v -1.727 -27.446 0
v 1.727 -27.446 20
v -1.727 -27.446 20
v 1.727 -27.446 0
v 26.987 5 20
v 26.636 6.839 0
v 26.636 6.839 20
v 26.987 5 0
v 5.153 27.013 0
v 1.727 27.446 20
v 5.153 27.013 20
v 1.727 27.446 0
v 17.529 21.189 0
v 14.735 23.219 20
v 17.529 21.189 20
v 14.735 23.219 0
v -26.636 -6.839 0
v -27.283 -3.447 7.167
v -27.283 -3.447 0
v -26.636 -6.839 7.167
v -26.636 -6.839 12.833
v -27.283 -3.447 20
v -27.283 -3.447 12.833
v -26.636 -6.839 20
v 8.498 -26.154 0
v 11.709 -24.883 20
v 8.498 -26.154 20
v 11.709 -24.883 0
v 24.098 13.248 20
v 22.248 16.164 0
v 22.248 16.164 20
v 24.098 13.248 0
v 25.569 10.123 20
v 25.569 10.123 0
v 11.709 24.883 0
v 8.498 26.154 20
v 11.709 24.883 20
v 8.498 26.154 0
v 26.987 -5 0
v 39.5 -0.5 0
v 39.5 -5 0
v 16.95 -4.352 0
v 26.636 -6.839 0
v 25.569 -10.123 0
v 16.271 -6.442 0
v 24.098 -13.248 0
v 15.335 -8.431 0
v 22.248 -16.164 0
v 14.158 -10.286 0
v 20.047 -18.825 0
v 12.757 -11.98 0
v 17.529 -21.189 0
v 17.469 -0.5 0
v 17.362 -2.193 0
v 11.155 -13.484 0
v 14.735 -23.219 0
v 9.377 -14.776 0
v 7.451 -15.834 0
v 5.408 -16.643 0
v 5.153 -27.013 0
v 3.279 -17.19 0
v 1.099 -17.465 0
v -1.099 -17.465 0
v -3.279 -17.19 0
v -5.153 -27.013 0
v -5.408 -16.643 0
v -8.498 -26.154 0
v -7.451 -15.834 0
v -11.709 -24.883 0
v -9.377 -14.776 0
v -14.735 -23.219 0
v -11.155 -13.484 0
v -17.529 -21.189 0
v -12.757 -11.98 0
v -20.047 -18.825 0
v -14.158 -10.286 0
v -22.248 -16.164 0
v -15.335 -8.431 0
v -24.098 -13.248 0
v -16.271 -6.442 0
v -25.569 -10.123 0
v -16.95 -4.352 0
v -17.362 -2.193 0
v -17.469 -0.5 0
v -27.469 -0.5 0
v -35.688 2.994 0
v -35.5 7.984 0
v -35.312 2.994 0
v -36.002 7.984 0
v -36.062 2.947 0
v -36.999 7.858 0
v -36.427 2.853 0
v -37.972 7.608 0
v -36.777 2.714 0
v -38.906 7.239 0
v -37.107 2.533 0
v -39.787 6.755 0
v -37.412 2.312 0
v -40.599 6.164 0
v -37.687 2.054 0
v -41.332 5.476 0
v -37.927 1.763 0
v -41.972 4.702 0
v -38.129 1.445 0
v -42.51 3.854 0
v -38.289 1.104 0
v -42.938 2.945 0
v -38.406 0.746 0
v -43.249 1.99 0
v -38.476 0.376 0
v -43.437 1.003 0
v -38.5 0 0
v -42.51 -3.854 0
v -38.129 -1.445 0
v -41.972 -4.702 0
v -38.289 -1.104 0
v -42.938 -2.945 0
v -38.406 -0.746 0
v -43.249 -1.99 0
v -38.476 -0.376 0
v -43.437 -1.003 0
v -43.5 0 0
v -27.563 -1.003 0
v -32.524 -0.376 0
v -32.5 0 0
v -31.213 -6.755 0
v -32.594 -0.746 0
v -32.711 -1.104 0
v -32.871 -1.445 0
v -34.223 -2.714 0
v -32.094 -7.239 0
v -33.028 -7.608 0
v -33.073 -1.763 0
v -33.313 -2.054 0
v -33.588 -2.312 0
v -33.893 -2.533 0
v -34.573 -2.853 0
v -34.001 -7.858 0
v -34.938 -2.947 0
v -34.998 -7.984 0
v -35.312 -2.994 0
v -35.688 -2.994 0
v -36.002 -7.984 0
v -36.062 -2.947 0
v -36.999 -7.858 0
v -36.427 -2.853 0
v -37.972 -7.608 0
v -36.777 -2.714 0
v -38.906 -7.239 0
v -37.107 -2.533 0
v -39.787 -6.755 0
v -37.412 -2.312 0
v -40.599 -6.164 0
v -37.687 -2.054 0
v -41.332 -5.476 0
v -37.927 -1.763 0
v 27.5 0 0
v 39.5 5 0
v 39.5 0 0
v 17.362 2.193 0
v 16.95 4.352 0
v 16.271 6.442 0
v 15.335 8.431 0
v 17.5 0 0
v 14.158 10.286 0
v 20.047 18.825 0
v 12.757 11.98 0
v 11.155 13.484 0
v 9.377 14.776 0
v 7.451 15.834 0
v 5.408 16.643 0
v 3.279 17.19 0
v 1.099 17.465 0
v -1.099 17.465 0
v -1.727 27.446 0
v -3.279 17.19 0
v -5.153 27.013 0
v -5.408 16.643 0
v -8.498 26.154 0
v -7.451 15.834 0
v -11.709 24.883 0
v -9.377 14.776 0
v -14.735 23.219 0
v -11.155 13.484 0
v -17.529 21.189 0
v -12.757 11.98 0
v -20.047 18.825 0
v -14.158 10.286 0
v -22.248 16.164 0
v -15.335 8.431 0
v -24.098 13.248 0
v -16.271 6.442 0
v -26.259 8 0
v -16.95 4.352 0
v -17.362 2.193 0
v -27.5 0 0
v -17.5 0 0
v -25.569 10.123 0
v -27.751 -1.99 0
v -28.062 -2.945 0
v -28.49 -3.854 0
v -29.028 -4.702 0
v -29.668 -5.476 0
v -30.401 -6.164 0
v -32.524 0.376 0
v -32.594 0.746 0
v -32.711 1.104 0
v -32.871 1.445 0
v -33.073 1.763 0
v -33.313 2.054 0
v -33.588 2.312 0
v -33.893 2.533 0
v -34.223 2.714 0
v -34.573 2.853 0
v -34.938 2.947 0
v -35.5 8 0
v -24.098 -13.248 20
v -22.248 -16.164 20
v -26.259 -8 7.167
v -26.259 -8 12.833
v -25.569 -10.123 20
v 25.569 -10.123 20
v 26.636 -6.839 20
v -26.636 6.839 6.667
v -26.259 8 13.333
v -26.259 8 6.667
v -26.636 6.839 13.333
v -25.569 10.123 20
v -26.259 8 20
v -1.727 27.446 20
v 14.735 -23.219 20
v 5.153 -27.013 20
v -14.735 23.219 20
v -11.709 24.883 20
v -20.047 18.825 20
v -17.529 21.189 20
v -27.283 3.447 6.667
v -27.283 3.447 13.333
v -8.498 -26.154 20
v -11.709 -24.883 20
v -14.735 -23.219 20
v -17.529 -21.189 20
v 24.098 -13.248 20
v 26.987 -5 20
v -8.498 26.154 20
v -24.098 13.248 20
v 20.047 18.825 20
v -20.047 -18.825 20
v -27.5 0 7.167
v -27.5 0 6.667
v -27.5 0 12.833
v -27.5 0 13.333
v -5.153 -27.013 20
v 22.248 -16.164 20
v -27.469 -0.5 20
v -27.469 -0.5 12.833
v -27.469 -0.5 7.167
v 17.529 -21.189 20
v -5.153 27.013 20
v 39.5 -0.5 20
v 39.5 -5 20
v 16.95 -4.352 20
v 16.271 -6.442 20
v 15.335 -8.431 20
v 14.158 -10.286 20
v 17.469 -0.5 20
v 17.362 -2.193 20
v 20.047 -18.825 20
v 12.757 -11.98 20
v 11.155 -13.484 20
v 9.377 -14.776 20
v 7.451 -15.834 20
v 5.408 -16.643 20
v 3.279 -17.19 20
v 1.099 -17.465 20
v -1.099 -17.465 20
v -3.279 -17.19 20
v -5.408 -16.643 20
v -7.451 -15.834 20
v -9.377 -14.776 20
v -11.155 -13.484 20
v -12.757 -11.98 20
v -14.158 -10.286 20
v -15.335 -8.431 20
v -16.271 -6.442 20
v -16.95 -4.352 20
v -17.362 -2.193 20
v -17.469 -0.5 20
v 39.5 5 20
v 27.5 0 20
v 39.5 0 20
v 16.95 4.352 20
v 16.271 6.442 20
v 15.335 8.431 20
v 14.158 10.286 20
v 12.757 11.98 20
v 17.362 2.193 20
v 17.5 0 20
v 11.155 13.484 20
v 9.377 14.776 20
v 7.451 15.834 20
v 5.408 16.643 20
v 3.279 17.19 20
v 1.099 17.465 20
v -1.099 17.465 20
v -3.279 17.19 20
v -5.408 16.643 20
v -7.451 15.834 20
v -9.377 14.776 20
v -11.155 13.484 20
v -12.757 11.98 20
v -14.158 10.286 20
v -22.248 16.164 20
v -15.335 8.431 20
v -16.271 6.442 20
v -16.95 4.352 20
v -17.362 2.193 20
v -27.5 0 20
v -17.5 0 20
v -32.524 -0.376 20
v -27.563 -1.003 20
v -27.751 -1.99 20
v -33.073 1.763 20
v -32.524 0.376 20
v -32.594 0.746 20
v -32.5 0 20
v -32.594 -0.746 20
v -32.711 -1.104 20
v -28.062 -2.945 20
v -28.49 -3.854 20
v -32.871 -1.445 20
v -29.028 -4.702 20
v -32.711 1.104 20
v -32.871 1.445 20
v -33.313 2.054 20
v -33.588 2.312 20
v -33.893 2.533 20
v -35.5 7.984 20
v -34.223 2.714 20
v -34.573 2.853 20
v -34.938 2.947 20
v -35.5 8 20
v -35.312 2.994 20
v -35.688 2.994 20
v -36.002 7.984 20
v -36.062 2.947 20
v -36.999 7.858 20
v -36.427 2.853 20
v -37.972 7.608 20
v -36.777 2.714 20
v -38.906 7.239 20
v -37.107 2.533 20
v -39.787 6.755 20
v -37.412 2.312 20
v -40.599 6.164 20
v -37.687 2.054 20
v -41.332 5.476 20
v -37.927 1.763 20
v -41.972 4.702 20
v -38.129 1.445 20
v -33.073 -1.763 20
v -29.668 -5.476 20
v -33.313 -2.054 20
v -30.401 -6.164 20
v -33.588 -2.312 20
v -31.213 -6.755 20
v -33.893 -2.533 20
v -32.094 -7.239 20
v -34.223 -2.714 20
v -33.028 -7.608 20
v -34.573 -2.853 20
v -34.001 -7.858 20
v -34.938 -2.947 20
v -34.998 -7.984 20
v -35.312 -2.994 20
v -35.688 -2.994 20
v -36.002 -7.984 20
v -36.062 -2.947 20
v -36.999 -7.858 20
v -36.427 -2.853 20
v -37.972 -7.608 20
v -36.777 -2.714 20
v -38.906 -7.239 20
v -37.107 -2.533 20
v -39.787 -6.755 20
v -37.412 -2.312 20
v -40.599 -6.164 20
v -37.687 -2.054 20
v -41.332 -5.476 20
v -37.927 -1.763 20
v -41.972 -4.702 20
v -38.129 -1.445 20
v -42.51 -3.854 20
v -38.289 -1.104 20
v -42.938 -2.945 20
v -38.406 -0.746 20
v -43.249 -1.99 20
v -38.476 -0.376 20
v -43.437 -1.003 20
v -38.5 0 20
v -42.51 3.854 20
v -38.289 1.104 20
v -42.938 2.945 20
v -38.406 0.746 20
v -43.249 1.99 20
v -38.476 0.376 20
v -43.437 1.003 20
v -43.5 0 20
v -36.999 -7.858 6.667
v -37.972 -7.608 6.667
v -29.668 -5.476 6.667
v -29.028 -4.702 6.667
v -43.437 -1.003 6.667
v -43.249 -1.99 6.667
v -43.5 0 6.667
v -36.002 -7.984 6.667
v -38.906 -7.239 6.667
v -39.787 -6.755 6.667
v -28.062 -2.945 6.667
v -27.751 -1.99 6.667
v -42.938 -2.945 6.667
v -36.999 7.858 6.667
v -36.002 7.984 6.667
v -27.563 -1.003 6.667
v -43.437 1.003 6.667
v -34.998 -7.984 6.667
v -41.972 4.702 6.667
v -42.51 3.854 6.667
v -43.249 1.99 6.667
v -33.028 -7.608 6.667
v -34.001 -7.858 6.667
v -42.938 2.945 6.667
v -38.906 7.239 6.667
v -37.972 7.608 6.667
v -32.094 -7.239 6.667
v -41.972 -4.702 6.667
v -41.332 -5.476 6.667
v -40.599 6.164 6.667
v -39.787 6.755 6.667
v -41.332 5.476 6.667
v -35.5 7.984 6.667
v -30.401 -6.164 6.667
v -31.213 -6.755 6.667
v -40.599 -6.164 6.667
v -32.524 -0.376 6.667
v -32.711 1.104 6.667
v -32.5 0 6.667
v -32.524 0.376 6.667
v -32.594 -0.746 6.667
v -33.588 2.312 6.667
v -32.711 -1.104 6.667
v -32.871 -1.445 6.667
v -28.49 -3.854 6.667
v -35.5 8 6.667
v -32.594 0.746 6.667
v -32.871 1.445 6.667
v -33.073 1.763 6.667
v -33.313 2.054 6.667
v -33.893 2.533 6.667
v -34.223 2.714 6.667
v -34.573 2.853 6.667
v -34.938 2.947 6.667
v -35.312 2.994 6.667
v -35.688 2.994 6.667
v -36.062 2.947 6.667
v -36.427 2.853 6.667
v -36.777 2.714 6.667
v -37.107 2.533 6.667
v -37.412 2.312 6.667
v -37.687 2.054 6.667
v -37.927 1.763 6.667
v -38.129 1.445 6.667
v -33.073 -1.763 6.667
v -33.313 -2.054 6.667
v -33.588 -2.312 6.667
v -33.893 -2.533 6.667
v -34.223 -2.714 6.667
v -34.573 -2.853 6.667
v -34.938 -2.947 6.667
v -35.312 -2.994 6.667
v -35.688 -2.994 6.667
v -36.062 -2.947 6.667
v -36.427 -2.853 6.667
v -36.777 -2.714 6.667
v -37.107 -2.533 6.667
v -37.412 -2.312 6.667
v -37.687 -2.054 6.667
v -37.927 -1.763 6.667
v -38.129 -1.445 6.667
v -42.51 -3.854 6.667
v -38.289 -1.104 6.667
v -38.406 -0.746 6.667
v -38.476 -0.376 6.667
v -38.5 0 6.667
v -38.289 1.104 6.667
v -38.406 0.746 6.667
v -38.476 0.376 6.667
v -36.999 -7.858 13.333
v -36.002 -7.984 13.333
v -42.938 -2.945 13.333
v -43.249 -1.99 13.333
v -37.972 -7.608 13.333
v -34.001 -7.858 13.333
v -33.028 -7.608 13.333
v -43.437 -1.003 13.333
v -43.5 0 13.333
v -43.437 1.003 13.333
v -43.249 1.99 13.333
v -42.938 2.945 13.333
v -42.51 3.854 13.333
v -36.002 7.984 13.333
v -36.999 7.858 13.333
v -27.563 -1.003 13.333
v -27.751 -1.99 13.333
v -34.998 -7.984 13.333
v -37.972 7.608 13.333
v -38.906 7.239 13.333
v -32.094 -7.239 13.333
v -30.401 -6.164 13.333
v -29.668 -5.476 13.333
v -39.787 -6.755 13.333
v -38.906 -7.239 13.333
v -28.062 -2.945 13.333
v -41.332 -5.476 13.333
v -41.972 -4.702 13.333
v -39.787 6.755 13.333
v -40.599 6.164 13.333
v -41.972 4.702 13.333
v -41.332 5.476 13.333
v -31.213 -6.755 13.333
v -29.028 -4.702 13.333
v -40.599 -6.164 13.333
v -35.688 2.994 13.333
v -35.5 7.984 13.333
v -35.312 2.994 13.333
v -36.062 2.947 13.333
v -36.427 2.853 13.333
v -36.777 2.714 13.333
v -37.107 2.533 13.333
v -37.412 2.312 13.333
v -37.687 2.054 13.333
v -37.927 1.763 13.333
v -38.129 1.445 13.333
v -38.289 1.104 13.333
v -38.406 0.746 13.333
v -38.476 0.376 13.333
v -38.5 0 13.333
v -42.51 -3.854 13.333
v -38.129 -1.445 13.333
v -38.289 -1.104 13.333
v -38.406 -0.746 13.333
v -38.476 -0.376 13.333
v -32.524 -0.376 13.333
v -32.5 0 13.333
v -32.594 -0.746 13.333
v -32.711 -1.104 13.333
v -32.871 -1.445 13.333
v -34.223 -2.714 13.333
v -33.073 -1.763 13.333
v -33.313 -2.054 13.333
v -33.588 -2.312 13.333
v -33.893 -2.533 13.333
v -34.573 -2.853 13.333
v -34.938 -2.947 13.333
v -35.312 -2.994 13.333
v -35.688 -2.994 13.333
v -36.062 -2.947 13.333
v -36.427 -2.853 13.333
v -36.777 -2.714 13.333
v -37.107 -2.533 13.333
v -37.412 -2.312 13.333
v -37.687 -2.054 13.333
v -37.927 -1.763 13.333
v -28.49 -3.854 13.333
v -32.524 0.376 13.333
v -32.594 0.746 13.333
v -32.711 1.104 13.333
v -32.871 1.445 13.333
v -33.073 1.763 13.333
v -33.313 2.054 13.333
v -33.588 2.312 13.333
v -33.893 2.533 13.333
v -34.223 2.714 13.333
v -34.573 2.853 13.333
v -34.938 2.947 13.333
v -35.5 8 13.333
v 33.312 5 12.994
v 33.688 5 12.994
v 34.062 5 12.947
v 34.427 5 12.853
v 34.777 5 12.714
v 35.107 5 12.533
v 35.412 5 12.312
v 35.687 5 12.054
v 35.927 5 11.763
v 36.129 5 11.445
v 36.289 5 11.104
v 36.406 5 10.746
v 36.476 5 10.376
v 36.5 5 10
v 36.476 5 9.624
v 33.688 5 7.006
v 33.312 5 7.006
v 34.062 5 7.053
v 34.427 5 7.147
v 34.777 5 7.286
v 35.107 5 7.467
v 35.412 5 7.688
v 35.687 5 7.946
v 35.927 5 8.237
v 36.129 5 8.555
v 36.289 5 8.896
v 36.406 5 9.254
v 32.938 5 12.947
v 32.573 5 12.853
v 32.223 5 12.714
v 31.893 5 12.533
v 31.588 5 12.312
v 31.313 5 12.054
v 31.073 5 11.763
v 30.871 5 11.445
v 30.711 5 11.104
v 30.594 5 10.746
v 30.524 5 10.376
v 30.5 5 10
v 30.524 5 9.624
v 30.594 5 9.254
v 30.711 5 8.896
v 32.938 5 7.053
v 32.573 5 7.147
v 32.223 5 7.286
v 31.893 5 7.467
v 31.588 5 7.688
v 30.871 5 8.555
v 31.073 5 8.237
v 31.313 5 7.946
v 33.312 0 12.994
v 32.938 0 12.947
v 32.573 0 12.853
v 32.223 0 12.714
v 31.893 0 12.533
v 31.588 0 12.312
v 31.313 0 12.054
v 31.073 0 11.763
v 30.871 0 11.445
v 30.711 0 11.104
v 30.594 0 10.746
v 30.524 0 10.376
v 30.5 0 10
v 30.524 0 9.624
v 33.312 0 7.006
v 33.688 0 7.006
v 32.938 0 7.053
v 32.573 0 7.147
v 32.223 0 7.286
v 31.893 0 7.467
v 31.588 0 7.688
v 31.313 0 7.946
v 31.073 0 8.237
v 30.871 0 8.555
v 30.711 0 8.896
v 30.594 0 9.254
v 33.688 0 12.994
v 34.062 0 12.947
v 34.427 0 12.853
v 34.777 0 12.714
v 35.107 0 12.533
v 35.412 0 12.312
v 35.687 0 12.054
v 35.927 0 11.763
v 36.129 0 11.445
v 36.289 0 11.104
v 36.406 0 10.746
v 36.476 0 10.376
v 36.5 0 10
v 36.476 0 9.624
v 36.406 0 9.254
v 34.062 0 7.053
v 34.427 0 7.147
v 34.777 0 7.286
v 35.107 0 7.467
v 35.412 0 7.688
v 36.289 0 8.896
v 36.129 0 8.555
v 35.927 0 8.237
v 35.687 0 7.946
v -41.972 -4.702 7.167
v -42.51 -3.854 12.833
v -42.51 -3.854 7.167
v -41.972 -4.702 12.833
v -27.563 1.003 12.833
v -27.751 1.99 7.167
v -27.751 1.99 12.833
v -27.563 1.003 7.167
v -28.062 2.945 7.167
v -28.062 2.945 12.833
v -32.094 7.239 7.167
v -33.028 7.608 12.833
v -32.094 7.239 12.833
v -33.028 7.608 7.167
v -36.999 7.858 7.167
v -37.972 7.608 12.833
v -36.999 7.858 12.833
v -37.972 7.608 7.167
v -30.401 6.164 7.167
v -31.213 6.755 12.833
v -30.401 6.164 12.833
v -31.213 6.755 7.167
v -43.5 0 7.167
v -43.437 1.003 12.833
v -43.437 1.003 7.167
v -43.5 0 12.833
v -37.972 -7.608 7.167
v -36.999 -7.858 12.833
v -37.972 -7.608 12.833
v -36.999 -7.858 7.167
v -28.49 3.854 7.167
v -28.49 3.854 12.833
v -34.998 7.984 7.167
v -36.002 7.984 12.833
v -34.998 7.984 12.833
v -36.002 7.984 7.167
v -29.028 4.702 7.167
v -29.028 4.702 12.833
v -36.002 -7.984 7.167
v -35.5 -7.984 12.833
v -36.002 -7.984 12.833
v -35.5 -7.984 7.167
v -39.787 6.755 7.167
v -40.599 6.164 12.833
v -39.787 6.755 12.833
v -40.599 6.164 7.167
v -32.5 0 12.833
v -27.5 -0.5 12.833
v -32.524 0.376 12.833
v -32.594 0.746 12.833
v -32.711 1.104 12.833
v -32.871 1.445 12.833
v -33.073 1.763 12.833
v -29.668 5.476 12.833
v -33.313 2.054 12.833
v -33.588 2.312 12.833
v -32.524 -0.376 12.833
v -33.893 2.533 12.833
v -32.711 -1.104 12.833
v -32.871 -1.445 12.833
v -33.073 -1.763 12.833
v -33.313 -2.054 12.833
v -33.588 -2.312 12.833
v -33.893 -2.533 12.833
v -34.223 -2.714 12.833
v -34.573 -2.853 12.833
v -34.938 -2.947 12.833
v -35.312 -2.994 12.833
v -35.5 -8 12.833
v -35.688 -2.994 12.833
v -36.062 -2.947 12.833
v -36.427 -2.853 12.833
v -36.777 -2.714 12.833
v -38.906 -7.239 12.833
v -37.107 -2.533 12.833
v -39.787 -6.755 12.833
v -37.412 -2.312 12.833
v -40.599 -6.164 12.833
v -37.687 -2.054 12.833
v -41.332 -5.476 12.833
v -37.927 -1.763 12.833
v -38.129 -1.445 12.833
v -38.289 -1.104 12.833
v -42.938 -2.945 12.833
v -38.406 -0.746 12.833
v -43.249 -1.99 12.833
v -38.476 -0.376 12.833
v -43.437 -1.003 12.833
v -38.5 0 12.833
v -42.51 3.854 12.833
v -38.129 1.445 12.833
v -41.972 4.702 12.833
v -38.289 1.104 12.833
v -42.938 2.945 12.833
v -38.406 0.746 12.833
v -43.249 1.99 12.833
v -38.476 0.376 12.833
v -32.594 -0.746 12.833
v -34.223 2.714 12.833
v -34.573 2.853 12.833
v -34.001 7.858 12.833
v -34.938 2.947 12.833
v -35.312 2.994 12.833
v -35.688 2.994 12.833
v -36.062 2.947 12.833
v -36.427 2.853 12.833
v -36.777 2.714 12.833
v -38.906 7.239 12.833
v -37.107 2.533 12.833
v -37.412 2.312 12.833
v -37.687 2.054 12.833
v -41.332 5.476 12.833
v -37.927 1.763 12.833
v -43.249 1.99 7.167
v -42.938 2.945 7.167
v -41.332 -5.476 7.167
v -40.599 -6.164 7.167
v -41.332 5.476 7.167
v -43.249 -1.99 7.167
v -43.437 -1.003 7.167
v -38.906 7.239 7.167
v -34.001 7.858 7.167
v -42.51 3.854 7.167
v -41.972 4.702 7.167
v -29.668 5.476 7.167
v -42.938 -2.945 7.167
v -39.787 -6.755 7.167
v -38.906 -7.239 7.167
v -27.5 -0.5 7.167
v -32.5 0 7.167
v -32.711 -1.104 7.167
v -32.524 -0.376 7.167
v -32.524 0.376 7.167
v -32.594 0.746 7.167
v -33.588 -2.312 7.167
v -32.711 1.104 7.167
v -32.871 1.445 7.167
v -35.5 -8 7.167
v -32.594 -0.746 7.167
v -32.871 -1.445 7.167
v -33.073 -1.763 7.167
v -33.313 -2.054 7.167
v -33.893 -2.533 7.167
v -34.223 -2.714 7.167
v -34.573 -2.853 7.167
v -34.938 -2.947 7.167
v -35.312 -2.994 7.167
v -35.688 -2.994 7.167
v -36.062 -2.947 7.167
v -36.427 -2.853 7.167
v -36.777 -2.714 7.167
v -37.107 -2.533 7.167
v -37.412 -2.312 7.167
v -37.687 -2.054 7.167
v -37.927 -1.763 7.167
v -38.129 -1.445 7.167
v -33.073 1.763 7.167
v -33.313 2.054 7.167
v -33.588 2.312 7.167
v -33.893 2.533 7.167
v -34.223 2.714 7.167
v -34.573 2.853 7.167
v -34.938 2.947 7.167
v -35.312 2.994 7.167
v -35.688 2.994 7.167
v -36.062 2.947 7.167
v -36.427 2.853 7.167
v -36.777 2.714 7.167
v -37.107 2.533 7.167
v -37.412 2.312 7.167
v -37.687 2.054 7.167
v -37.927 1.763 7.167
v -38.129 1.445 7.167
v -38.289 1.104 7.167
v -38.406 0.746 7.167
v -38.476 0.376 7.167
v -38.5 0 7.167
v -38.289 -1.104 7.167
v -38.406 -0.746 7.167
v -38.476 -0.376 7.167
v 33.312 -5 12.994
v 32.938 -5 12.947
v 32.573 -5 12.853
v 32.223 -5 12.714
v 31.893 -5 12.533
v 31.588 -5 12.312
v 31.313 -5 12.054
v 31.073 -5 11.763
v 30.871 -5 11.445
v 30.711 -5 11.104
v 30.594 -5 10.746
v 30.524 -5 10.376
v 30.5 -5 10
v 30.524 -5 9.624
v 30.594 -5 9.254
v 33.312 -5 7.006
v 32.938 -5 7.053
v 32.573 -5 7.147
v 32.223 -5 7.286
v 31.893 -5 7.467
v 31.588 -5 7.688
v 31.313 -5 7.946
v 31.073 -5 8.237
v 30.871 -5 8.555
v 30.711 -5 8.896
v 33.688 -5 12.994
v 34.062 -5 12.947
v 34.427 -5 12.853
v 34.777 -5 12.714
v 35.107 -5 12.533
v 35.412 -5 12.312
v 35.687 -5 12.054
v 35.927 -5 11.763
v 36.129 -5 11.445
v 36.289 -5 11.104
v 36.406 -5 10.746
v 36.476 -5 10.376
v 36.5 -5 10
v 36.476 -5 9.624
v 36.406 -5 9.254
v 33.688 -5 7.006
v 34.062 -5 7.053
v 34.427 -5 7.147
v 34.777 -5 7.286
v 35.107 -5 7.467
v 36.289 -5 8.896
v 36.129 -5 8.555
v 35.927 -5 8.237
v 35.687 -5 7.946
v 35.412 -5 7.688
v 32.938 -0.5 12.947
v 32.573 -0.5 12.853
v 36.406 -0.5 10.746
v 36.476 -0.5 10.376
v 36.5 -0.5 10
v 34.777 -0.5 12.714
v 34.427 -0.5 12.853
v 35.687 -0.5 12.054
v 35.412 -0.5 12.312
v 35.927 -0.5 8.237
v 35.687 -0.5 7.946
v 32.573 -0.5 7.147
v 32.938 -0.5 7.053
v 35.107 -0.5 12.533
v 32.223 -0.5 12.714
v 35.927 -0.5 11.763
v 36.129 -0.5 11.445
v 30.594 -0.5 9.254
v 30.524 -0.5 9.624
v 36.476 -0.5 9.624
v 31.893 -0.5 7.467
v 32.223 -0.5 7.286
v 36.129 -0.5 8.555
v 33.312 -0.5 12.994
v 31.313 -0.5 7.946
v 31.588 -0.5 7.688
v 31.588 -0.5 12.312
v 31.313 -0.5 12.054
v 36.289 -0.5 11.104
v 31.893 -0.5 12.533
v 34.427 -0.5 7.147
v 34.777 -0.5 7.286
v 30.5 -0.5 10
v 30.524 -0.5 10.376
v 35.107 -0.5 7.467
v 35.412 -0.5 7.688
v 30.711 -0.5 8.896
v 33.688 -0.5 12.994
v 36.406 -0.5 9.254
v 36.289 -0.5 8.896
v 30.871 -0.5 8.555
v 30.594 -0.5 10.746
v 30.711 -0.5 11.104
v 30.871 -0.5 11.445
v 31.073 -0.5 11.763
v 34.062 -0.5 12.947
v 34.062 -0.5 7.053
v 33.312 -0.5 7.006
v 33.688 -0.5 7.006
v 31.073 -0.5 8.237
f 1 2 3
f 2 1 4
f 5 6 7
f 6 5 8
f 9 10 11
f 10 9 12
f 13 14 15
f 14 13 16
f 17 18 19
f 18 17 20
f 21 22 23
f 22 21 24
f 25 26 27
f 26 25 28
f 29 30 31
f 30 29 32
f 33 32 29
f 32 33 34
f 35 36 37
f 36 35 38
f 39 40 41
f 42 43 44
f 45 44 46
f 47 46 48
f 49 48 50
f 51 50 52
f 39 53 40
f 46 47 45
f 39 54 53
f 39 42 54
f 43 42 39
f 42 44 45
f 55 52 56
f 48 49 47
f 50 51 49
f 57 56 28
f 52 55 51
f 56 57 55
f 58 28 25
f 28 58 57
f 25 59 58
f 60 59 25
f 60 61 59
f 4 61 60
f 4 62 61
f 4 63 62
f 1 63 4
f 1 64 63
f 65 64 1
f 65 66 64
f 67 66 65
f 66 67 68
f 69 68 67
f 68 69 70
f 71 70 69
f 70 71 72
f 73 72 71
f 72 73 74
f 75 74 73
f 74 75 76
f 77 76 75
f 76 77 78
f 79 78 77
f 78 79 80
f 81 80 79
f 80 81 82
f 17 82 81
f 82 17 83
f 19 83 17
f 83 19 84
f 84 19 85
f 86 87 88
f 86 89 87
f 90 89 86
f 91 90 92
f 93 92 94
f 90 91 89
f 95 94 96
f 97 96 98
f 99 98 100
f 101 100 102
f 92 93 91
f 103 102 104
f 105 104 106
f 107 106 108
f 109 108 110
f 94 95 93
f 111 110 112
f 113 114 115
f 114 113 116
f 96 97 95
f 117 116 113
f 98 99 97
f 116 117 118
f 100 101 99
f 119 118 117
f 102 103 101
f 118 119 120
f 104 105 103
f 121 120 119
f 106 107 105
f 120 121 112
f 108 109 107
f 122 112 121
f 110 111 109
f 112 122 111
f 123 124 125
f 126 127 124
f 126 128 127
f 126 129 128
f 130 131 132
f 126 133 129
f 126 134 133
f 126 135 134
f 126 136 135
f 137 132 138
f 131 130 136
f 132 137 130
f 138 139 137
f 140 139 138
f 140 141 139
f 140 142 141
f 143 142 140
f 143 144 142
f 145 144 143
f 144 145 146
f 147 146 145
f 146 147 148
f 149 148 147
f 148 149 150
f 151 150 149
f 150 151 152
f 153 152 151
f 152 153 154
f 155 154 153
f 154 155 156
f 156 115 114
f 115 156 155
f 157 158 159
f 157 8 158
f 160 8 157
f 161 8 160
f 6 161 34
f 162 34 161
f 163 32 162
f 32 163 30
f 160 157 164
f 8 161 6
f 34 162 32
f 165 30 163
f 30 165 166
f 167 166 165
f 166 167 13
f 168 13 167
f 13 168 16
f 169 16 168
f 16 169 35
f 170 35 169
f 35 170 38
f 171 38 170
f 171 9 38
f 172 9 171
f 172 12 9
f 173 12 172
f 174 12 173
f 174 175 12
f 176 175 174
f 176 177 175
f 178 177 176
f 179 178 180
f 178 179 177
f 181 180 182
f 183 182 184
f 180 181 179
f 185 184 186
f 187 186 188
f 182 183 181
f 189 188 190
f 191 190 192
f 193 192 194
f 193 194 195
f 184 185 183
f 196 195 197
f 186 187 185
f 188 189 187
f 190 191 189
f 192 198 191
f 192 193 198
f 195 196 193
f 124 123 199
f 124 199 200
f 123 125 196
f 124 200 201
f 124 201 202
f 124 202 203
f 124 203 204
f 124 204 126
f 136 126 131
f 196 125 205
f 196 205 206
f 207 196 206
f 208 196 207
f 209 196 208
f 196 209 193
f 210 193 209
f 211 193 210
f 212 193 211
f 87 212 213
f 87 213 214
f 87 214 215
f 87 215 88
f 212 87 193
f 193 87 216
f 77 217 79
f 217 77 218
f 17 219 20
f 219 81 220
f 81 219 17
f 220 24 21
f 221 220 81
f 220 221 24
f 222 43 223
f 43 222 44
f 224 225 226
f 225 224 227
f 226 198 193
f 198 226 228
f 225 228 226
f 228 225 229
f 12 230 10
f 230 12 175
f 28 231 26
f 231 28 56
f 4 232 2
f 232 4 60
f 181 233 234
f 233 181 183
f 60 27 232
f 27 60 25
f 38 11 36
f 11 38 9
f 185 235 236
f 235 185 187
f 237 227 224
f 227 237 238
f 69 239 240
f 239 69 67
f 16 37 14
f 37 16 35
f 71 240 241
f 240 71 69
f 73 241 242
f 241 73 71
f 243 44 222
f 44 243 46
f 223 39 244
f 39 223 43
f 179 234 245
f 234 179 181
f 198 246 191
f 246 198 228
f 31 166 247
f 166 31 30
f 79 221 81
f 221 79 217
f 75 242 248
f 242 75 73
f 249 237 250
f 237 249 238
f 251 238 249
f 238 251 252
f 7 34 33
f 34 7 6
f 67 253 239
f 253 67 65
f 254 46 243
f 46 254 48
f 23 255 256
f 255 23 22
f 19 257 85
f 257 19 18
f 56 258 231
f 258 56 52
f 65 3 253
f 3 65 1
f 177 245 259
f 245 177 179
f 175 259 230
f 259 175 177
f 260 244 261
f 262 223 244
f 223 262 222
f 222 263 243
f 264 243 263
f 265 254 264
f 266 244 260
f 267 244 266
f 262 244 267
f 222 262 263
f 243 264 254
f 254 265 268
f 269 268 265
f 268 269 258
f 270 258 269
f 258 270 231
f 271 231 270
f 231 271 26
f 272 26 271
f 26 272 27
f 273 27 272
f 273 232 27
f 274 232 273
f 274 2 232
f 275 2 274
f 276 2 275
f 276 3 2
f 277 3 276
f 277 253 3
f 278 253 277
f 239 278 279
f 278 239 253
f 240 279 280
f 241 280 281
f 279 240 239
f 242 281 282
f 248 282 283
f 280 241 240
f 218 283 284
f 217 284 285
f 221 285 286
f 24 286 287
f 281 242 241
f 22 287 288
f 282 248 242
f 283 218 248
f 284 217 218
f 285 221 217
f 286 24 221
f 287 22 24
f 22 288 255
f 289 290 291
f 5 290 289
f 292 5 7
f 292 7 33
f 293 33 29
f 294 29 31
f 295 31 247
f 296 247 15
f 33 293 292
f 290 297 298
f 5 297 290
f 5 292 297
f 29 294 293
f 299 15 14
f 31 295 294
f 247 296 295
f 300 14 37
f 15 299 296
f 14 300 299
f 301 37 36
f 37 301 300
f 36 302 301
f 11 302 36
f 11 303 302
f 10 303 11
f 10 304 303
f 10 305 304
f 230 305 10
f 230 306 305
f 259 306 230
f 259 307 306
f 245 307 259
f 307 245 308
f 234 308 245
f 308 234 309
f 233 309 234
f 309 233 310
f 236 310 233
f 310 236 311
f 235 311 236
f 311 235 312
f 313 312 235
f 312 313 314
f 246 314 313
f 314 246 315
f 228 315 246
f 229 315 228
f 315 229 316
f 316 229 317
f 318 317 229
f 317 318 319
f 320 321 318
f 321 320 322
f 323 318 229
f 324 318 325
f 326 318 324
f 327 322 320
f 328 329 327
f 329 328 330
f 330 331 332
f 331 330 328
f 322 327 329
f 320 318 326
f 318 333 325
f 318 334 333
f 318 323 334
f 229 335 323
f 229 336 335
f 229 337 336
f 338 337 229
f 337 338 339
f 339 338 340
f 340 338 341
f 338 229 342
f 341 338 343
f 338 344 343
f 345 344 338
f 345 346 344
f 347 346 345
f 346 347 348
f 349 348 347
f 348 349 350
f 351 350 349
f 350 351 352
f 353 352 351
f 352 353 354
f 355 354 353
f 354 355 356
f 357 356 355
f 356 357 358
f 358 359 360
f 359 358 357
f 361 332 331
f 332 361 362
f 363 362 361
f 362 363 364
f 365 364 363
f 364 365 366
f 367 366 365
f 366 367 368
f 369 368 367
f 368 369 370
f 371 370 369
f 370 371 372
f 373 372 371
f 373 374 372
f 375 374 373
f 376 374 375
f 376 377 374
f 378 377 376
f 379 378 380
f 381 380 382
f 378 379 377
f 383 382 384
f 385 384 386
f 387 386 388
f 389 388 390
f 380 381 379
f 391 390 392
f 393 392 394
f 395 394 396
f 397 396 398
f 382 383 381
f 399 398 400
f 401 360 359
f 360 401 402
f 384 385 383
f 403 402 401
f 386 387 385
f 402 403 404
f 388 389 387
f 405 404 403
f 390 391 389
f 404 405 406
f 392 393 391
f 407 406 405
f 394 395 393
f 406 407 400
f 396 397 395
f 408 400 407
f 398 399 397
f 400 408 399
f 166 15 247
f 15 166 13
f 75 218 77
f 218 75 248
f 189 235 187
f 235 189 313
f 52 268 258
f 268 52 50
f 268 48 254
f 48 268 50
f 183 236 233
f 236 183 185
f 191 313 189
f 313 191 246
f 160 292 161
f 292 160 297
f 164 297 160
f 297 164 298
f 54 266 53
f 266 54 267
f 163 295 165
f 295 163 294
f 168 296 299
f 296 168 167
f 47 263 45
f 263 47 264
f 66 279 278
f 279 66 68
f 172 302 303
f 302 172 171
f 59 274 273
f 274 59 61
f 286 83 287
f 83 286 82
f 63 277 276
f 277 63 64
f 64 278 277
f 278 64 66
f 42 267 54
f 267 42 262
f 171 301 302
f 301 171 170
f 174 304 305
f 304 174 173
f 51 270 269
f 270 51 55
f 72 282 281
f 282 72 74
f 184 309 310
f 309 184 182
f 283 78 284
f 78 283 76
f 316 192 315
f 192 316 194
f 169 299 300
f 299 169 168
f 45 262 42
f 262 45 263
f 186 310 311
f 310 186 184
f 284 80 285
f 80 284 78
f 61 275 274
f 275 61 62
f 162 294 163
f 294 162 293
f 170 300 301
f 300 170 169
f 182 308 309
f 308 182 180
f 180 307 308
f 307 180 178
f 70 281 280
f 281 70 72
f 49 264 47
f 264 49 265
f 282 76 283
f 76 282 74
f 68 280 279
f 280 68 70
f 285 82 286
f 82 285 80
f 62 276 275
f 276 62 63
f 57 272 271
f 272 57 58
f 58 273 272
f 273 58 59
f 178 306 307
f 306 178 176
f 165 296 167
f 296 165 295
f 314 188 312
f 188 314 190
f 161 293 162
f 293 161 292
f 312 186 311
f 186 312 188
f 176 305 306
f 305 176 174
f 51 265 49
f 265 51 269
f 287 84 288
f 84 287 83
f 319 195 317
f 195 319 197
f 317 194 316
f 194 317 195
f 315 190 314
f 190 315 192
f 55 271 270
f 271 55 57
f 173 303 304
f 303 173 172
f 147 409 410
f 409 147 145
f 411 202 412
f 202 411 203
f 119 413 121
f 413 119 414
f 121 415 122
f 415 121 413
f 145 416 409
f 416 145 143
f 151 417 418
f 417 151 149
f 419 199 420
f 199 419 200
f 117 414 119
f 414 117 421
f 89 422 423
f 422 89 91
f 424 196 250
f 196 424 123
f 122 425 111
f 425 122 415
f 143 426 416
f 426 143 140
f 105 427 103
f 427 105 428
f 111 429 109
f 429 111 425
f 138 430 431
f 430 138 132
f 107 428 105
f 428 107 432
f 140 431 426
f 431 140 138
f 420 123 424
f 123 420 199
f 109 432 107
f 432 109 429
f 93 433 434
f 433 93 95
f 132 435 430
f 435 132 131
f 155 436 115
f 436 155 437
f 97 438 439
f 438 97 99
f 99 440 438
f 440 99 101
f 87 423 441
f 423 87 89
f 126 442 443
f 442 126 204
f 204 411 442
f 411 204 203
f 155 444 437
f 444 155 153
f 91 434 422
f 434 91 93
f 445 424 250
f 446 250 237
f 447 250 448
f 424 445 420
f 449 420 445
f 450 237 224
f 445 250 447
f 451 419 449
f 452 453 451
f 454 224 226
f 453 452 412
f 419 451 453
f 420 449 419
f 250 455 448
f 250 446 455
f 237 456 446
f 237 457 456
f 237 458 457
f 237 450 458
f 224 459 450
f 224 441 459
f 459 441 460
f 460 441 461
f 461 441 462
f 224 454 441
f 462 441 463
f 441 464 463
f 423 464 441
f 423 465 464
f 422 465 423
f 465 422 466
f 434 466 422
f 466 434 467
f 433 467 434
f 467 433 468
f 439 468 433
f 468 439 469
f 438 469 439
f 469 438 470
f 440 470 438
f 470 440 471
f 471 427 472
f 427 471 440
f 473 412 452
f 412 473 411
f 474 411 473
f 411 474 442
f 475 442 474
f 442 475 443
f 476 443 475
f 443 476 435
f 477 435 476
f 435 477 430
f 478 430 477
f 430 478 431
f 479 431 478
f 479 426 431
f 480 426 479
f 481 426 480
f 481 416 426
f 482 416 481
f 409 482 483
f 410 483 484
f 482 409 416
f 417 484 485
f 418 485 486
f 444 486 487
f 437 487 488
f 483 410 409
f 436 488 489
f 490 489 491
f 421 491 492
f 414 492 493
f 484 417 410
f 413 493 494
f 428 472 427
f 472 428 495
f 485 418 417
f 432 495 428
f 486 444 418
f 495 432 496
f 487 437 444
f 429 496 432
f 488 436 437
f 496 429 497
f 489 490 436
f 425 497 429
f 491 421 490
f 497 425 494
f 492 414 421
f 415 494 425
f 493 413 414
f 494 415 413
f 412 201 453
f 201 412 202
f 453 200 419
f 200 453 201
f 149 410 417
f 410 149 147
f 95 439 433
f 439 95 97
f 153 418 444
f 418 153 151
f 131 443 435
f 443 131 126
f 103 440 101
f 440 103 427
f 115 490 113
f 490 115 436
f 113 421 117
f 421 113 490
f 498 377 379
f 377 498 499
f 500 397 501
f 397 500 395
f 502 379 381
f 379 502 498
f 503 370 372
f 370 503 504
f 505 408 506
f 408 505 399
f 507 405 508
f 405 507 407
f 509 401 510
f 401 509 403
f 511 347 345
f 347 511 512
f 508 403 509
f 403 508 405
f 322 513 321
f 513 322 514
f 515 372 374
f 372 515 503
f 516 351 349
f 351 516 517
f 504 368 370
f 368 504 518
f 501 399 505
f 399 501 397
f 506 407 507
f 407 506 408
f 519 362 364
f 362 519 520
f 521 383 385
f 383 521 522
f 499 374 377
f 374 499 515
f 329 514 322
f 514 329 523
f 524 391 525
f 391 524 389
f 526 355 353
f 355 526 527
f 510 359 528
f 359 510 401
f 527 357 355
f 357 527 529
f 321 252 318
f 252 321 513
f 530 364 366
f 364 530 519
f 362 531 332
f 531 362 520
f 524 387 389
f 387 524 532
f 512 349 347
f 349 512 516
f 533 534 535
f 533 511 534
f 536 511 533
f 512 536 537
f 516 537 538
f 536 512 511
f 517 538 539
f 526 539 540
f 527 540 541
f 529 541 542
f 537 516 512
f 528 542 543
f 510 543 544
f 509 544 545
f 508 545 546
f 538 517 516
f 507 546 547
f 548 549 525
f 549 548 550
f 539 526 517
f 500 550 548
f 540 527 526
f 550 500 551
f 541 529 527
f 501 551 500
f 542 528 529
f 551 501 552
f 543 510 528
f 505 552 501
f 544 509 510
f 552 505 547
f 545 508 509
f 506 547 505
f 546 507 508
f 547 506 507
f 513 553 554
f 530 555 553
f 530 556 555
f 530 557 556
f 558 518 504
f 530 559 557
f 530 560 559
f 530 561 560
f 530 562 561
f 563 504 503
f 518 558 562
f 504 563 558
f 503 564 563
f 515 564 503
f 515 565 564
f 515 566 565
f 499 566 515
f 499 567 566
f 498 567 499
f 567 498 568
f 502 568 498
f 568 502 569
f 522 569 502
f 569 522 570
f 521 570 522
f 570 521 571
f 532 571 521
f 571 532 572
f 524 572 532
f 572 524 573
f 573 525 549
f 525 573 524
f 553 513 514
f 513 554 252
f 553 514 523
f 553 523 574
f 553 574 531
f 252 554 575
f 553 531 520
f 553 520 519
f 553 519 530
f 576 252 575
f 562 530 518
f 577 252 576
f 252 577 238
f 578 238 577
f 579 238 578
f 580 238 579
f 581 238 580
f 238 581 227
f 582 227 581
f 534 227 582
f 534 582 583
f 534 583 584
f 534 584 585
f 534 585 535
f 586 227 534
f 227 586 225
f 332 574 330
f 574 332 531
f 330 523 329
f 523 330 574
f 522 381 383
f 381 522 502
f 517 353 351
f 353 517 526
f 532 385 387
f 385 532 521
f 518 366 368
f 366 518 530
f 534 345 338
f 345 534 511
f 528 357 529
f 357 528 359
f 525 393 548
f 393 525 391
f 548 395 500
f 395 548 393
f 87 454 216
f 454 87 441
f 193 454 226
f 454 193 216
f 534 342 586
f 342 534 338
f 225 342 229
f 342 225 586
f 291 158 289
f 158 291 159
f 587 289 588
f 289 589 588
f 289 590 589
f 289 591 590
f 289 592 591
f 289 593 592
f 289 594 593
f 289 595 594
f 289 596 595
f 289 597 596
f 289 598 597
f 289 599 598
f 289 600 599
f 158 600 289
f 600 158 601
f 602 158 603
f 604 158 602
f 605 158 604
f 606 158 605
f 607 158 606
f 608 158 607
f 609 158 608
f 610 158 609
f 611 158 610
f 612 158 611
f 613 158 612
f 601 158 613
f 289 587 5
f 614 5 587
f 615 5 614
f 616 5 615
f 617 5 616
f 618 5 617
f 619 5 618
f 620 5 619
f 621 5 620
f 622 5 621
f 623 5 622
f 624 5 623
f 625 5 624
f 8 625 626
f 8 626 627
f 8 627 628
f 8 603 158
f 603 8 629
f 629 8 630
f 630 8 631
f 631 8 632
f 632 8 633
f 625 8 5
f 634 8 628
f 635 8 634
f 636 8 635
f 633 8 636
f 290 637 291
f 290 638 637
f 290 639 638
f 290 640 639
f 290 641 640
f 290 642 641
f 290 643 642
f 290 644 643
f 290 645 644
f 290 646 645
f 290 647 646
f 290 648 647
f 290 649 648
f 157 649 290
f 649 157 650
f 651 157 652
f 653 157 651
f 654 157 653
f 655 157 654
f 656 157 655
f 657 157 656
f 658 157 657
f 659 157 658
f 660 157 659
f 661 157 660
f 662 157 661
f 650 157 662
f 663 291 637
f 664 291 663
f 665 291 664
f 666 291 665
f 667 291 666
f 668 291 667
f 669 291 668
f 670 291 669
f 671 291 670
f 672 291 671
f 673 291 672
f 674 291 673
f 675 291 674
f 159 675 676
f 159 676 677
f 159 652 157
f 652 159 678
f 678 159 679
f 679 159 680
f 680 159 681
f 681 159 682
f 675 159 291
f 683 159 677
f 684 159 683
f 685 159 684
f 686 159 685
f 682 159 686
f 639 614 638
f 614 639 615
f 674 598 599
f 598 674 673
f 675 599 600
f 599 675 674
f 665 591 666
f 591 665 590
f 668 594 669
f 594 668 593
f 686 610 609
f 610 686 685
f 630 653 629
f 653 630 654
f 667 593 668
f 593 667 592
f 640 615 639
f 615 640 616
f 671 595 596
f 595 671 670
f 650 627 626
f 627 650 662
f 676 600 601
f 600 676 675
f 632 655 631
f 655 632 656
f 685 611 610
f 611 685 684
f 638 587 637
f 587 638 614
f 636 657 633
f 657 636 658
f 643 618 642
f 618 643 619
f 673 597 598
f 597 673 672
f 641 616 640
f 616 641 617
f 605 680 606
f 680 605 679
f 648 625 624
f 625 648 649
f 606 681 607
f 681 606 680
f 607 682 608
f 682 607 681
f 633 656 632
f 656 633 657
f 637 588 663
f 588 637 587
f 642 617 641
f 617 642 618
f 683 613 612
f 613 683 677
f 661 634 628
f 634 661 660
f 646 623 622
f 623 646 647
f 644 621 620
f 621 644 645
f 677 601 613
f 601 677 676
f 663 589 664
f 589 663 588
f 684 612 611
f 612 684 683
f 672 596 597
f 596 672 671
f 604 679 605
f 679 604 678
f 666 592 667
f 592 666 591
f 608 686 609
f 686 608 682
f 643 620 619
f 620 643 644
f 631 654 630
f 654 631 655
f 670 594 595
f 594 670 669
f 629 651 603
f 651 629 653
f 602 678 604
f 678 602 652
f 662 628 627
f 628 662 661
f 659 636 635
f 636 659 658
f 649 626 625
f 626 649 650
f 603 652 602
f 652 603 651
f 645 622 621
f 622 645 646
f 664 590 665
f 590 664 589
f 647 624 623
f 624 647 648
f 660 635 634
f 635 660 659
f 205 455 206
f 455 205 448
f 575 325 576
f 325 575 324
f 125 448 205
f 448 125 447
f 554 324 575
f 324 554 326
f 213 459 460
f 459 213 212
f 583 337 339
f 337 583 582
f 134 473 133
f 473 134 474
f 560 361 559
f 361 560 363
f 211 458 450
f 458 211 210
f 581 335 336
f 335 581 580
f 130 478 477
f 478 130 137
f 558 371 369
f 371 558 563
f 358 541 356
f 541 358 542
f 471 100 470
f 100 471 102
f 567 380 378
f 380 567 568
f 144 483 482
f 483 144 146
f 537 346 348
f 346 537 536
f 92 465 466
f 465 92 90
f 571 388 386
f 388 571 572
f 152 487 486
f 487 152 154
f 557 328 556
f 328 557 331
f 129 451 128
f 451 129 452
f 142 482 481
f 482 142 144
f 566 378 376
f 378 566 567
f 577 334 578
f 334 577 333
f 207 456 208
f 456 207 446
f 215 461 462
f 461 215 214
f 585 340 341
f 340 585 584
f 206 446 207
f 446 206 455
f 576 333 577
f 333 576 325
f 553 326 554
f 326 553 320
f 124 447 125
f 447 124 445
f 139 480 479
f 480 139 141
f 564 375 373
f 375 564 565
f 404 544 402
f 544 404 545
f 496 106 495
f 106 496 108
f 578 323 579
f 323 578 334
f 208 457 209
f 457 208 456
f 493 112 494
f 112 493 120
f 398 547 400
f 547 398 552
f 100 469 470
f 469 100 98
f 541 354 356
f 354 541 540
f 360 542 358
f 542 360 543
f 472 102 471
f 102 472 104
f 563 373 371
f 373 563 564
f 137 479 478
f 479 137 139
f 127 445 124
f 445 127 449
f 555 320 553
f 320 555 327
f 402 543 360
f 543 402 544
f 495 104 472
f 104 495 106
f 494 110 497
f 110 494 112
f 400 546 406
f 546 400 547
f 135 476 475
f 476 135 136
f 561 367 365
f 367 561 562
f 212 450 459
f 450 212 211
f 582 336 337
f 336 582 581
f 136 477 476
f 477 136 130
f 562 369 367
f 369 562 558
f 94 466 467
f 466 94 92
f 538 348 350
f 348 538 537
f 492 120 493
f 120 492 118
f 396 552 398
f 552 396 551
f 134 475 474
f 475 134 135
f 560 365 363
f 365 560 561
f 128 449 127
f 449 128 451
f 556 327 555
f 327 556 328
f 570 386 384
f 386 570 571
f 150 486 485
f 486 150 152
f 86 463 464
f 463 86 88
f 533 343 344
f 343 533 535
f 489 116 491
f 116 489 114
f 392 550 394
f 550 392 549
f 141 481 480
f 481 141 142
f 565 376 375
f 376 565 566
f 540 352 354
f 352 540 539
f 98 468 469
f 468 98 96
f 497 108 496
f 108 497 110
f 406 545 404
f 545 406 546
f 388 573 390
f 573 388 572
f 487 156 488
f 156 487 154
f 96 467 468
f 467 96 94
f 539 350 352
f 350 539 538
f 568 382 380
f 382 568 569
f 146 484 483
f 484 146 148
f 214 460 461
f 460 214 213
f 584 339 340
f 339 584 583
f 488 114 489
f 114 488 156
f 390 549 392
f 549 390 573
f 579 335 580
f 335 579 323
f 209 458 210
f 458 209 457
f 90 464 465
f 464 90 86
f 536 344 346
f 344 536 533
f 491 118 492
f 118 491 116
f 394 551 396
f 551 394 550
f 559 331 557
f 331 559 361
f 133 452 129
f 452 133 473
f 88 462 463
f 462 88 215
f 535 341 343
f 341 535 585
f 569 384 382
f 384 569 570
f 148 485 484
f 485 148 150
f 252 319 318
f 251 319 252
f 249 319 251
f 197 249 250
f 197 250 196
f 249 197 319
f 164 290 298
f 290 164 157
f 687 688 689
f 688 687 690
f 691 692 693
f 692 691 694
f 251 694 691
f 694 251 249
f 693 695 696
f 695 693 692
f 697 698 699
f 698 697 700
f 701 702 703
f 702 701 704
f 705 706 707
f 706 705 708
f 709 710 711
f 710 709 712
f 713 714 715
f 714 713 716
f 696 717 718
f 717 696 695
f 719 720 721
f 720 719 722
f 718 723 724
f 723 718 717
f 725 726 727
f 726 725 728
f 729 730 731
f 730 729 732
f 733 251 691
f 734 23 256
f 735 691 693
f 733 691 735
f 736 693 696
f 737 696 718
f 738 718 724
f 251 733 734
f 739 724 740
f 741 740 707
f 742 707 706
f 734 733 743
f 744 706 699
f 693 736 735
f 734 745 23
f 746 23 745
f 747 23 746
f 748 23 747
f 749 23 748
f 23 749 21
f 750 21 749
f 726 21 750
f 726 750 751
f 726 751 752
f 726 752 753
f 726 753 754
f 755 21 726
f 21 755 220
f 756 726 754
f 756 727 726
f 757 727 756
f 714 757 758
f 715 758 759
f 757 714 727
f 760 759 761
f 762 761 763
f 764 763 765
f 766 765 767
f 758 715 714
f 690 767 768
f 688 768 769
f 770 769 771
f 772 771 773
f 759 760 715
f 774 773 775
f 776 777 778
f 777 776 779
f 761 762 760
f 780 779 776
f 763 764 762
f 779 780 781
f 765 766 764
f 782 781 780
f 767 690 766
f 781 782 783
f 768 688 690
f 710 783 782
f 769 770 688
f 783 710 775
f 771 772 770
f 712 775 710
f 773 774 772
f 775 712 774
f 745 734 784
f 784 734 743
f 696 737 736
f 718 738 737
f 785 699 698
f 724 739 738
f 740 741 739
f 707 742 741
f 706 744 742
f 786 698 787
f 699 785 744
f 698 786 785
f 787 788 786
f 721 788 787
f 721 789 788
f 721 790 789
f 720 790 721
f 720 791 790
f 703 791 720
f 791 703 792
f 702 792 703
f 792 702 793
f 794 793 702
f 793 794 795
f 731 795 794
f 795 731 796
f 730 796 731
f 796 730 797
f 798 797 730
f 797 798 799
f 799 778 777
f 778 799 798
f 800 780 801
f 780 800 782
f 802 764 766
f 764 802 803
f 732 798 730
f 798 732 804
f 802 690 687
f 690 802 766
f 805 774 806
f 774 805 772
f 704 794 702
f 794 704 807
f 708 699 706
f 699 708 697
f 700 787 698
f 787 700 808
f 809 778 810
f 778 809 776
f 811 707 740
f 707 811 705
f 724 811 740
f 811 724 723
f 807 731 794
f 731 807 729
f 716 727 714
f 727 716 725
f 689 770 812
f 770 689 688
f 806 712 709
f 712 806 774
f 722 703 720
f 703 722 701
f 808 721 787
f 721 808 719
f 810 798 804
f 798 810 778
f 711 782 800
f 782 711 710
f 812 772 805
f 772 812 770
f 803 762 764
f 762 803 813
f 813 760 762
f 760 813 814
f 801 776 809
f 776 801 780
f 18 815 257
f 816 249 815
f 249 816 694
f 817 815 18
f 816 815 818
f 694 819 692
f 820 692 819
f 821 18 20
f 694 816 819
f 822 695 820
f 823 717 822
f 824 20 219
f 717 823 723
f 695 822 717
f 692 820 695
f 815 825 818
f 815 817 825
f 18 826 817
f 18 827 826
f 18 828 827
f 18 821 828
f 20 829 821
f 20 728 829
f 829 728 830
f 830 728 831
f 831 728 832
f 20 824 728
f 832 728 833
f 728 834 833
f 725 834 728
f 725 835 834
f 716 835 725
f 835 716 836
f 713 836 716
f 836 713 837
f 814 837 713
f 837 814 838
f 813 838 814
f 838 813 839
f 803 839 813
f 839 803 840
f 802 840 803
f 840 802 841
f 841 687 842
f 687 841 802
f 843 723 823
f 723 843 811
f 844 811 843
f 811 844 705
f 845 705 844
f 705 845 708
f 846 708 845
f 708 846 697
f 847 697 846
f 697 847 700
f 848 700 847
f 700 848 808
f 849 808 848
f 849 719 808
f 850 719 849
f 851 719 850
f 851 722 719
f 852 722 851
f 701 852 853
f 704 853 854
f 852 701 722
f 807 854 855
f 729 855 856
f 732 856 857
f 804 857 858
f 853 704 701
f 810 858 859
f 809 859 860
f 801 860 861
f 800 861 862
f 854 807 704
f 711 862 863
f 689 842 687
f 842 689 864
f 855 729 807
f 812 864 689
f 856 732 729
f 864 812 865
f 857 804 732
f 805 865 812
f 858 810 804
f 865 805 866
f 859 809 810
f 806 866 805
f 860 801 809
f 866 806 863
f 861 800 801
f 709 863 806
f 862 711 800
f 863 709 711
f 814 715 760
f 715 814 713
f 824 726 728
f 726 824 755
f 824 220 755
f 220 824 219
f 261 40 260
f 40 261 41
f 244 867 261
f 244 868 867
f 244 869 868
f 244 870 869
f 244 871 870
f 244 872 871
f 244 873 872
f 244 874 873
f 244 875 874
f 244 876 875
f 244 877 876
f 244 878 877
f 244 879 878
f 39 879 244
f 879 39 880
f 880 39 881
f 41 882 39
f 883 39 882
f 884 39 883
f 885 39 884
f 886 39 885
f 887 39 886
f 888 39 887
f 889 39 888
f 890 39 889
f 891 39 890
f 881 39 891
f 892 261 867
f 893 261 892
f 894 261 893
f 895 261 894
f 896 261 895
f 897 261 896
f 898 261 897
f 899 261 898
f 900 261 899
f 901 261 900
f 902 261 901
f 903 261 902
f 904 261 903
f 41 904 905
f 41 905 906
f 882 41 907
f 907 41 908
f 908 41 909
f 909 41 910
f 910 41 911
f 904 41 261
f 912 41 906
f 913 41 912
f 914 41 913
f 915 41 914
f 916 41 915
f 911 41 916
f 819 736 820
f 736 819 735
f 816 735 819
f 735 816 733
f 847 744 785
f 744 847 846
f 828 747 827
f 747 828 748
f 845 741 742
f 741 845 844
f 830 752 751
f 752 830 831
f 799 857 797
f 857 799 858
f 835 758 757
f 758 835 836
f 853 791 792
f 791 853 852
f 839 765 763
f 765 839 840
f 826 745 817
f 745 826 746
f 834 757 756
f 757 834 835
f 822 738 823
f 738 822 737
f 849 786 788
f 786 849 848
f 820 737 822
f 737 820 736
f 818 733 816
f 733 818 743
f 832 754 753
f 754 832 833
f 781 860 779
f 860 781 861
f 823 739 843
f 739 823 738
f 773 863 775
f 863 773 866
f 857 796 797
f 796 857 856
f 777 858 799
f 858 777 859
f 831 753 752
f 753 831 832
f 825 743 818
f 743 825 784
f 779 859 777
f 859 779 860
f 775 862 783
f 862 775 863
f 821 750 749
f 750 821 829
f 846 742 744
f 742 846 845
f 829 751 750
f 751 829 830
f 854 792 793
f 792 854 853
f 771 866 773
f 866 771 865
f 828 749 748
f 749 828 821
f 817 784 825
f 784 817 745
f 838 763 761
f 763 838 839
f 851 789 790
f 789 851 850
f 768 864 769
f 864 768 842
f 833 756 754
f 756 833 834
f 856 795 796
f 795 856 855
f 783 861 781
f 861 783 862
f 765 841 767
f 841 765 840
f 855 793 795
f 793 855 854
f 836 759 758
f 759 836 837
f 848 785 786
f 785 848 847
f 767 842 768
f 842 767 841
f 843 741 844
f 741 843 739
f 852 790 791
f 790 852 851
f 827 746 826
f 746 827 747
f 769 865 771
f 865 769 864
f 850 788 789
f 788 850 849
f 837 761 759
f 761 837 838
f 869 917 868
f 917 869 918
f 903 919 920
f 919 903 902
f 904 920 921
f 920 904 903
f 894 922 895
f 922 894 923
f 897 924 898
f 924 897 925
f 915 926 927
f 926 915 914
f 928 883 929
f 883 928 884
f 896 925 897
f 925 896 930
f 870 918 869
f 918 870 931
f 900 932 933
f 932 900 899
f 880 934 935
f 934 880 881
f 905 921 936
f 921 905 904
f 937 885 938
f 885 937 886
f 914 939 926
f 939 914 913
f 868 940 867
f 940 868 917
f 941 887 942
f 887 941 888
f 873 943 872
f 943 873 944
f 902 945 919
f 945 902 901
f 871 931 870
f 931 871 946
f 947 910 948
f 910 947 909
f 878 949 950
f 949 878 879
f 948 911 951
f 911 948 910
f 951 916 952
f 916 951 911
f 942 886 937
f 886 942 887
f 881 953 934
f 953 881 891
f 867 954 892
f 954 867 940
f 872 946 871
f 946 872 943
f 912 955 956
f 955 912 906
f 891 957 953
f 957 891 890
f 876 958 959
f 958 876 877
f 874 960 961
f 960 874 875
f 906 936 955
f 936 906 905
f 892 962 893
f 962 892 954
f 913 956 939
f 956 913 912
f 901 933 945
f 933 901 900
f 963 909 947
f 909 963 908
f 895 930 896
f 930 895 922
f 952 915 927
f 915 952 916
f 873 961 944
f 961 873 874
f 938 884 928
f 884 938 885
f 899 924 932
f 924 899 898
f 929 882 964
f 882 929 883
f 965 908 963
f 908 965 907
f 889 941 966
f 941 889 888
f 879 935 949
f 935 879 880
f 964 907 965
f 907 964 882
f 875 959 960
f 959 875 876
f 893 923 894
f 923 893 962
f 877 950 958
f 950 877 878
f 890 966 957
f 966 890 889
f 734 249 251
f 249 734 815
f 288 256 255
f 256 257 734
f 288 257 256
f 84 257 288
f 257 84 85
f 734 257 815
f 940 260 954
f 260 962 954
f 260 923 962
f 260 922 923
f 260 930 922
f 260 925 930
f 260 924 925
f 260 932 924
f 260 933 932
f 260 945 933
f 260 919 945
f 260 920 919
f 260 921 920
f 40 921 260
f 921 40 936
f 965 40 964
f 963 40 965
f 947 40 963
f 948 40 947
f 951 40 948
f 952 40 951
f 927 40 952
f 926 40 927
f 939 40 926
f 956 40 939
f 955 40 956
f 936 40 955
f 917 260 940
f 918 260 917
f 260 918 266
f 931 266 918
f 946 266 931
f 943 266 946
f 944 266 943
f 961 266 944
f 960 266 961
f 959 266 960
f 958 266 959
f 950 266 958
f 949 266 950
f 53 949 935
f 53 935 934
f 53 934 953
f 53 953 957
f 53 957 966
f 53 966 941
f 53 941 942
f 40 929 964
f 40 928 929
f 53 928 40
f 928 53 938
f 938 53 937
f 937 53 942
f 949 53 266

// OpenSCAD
// Customizable Pipe Clamp
// Author Mathias Dietz
// http://gcodeprintr.dietzm.de

//Radius of the pipe 
r1=17.5; 
//Width of the pipe clamp
h=20; // [10:100] 
//Strength of the pipe clamp
s=10; // [10:Strong,8:Normal, 6:Light]
//Radius of the screw holes 
r4=3; // [1.5:0.5:5] 
//Connector Type
con=0; // [0:None,1:Hole,2:Cube]

/* [Hidden] */

r2=r1+s; 
w=14; 
r3=8; 
th=5; 
$fn=50;

oring();
//translate([-3,16.5,0]) rotate([0,0,20]) oring();

difference(){
    uring();
 if (con==1) {
     translate([0,-5,h/2]) rotate([90,0,0]) cylinder(r=r4,h=r2) ;
     translate([0,0,h/2]) rotate([90,0,0]) cylinder(r=r4+2,h=r1+strong/4) ;
 } 
}
if (con==2) {
    difference(){
     translate([-s/2,r2-s/4,0]) cube([s,w+0.5,h]);
     translate([-s,r2+w/2-0.5,h/2]) rotate([90,0,90]) cylinder(r=r4,h=r2) ;
    }
 } 

module uring(){
difference(){
union(){
    ring();
translate([-r2-r3,0,h/3+0.5]) cylinder(r=r3,h=h/3-1);
translate([-r2-r3,-r3,h/3+0.5]) cube([w,r3,h/3-1]);
 translate([r2-2,-th,0]) cube([w,th,h]);
}
translate([-r2-r3,0,h/3]) cylinder(r=r4,h=h/3);
translate([r2+w/2-1,0,h/2]) rotate([90,0,0]) cylinder(r=r4,h=th+1) ;
translate([-r2,-0.5,0]) cube([r2*2+w,r2+1,h+1]);
}
}

module oring(){

difference(){
union(){
      ring();
translate([-r2-r3,0,0]) cylinder(r=r3,h=h/3);
translate([-r2-r3,0,h/3*2]) cylinder(r=r3,h=h/3);
translate([-r2-r3,0,0]) cube([w,r3,h/3]);
    translate([-r2-r3,0,h/3*2]) cube([w,r3,h/3]);
    translate([r2-2,0,0]) cube([w,th,h]);
}
translate([r2+w/2-1,th+1,h/2]) rotate([90,0,0]) cylinder(r=r4,h=th+1) ;
translate([-r2-r3,0,0]) cylinder(r=r4,h=h);
translate([-r2,-r2,0]) cube([r2*2,r2,h+1]); //halbkreis
}
}


module ring(){
    difference(){
        cylinder(r=r2,h=h);
        cylinder(r=r1,h=h+1);
    }
}
